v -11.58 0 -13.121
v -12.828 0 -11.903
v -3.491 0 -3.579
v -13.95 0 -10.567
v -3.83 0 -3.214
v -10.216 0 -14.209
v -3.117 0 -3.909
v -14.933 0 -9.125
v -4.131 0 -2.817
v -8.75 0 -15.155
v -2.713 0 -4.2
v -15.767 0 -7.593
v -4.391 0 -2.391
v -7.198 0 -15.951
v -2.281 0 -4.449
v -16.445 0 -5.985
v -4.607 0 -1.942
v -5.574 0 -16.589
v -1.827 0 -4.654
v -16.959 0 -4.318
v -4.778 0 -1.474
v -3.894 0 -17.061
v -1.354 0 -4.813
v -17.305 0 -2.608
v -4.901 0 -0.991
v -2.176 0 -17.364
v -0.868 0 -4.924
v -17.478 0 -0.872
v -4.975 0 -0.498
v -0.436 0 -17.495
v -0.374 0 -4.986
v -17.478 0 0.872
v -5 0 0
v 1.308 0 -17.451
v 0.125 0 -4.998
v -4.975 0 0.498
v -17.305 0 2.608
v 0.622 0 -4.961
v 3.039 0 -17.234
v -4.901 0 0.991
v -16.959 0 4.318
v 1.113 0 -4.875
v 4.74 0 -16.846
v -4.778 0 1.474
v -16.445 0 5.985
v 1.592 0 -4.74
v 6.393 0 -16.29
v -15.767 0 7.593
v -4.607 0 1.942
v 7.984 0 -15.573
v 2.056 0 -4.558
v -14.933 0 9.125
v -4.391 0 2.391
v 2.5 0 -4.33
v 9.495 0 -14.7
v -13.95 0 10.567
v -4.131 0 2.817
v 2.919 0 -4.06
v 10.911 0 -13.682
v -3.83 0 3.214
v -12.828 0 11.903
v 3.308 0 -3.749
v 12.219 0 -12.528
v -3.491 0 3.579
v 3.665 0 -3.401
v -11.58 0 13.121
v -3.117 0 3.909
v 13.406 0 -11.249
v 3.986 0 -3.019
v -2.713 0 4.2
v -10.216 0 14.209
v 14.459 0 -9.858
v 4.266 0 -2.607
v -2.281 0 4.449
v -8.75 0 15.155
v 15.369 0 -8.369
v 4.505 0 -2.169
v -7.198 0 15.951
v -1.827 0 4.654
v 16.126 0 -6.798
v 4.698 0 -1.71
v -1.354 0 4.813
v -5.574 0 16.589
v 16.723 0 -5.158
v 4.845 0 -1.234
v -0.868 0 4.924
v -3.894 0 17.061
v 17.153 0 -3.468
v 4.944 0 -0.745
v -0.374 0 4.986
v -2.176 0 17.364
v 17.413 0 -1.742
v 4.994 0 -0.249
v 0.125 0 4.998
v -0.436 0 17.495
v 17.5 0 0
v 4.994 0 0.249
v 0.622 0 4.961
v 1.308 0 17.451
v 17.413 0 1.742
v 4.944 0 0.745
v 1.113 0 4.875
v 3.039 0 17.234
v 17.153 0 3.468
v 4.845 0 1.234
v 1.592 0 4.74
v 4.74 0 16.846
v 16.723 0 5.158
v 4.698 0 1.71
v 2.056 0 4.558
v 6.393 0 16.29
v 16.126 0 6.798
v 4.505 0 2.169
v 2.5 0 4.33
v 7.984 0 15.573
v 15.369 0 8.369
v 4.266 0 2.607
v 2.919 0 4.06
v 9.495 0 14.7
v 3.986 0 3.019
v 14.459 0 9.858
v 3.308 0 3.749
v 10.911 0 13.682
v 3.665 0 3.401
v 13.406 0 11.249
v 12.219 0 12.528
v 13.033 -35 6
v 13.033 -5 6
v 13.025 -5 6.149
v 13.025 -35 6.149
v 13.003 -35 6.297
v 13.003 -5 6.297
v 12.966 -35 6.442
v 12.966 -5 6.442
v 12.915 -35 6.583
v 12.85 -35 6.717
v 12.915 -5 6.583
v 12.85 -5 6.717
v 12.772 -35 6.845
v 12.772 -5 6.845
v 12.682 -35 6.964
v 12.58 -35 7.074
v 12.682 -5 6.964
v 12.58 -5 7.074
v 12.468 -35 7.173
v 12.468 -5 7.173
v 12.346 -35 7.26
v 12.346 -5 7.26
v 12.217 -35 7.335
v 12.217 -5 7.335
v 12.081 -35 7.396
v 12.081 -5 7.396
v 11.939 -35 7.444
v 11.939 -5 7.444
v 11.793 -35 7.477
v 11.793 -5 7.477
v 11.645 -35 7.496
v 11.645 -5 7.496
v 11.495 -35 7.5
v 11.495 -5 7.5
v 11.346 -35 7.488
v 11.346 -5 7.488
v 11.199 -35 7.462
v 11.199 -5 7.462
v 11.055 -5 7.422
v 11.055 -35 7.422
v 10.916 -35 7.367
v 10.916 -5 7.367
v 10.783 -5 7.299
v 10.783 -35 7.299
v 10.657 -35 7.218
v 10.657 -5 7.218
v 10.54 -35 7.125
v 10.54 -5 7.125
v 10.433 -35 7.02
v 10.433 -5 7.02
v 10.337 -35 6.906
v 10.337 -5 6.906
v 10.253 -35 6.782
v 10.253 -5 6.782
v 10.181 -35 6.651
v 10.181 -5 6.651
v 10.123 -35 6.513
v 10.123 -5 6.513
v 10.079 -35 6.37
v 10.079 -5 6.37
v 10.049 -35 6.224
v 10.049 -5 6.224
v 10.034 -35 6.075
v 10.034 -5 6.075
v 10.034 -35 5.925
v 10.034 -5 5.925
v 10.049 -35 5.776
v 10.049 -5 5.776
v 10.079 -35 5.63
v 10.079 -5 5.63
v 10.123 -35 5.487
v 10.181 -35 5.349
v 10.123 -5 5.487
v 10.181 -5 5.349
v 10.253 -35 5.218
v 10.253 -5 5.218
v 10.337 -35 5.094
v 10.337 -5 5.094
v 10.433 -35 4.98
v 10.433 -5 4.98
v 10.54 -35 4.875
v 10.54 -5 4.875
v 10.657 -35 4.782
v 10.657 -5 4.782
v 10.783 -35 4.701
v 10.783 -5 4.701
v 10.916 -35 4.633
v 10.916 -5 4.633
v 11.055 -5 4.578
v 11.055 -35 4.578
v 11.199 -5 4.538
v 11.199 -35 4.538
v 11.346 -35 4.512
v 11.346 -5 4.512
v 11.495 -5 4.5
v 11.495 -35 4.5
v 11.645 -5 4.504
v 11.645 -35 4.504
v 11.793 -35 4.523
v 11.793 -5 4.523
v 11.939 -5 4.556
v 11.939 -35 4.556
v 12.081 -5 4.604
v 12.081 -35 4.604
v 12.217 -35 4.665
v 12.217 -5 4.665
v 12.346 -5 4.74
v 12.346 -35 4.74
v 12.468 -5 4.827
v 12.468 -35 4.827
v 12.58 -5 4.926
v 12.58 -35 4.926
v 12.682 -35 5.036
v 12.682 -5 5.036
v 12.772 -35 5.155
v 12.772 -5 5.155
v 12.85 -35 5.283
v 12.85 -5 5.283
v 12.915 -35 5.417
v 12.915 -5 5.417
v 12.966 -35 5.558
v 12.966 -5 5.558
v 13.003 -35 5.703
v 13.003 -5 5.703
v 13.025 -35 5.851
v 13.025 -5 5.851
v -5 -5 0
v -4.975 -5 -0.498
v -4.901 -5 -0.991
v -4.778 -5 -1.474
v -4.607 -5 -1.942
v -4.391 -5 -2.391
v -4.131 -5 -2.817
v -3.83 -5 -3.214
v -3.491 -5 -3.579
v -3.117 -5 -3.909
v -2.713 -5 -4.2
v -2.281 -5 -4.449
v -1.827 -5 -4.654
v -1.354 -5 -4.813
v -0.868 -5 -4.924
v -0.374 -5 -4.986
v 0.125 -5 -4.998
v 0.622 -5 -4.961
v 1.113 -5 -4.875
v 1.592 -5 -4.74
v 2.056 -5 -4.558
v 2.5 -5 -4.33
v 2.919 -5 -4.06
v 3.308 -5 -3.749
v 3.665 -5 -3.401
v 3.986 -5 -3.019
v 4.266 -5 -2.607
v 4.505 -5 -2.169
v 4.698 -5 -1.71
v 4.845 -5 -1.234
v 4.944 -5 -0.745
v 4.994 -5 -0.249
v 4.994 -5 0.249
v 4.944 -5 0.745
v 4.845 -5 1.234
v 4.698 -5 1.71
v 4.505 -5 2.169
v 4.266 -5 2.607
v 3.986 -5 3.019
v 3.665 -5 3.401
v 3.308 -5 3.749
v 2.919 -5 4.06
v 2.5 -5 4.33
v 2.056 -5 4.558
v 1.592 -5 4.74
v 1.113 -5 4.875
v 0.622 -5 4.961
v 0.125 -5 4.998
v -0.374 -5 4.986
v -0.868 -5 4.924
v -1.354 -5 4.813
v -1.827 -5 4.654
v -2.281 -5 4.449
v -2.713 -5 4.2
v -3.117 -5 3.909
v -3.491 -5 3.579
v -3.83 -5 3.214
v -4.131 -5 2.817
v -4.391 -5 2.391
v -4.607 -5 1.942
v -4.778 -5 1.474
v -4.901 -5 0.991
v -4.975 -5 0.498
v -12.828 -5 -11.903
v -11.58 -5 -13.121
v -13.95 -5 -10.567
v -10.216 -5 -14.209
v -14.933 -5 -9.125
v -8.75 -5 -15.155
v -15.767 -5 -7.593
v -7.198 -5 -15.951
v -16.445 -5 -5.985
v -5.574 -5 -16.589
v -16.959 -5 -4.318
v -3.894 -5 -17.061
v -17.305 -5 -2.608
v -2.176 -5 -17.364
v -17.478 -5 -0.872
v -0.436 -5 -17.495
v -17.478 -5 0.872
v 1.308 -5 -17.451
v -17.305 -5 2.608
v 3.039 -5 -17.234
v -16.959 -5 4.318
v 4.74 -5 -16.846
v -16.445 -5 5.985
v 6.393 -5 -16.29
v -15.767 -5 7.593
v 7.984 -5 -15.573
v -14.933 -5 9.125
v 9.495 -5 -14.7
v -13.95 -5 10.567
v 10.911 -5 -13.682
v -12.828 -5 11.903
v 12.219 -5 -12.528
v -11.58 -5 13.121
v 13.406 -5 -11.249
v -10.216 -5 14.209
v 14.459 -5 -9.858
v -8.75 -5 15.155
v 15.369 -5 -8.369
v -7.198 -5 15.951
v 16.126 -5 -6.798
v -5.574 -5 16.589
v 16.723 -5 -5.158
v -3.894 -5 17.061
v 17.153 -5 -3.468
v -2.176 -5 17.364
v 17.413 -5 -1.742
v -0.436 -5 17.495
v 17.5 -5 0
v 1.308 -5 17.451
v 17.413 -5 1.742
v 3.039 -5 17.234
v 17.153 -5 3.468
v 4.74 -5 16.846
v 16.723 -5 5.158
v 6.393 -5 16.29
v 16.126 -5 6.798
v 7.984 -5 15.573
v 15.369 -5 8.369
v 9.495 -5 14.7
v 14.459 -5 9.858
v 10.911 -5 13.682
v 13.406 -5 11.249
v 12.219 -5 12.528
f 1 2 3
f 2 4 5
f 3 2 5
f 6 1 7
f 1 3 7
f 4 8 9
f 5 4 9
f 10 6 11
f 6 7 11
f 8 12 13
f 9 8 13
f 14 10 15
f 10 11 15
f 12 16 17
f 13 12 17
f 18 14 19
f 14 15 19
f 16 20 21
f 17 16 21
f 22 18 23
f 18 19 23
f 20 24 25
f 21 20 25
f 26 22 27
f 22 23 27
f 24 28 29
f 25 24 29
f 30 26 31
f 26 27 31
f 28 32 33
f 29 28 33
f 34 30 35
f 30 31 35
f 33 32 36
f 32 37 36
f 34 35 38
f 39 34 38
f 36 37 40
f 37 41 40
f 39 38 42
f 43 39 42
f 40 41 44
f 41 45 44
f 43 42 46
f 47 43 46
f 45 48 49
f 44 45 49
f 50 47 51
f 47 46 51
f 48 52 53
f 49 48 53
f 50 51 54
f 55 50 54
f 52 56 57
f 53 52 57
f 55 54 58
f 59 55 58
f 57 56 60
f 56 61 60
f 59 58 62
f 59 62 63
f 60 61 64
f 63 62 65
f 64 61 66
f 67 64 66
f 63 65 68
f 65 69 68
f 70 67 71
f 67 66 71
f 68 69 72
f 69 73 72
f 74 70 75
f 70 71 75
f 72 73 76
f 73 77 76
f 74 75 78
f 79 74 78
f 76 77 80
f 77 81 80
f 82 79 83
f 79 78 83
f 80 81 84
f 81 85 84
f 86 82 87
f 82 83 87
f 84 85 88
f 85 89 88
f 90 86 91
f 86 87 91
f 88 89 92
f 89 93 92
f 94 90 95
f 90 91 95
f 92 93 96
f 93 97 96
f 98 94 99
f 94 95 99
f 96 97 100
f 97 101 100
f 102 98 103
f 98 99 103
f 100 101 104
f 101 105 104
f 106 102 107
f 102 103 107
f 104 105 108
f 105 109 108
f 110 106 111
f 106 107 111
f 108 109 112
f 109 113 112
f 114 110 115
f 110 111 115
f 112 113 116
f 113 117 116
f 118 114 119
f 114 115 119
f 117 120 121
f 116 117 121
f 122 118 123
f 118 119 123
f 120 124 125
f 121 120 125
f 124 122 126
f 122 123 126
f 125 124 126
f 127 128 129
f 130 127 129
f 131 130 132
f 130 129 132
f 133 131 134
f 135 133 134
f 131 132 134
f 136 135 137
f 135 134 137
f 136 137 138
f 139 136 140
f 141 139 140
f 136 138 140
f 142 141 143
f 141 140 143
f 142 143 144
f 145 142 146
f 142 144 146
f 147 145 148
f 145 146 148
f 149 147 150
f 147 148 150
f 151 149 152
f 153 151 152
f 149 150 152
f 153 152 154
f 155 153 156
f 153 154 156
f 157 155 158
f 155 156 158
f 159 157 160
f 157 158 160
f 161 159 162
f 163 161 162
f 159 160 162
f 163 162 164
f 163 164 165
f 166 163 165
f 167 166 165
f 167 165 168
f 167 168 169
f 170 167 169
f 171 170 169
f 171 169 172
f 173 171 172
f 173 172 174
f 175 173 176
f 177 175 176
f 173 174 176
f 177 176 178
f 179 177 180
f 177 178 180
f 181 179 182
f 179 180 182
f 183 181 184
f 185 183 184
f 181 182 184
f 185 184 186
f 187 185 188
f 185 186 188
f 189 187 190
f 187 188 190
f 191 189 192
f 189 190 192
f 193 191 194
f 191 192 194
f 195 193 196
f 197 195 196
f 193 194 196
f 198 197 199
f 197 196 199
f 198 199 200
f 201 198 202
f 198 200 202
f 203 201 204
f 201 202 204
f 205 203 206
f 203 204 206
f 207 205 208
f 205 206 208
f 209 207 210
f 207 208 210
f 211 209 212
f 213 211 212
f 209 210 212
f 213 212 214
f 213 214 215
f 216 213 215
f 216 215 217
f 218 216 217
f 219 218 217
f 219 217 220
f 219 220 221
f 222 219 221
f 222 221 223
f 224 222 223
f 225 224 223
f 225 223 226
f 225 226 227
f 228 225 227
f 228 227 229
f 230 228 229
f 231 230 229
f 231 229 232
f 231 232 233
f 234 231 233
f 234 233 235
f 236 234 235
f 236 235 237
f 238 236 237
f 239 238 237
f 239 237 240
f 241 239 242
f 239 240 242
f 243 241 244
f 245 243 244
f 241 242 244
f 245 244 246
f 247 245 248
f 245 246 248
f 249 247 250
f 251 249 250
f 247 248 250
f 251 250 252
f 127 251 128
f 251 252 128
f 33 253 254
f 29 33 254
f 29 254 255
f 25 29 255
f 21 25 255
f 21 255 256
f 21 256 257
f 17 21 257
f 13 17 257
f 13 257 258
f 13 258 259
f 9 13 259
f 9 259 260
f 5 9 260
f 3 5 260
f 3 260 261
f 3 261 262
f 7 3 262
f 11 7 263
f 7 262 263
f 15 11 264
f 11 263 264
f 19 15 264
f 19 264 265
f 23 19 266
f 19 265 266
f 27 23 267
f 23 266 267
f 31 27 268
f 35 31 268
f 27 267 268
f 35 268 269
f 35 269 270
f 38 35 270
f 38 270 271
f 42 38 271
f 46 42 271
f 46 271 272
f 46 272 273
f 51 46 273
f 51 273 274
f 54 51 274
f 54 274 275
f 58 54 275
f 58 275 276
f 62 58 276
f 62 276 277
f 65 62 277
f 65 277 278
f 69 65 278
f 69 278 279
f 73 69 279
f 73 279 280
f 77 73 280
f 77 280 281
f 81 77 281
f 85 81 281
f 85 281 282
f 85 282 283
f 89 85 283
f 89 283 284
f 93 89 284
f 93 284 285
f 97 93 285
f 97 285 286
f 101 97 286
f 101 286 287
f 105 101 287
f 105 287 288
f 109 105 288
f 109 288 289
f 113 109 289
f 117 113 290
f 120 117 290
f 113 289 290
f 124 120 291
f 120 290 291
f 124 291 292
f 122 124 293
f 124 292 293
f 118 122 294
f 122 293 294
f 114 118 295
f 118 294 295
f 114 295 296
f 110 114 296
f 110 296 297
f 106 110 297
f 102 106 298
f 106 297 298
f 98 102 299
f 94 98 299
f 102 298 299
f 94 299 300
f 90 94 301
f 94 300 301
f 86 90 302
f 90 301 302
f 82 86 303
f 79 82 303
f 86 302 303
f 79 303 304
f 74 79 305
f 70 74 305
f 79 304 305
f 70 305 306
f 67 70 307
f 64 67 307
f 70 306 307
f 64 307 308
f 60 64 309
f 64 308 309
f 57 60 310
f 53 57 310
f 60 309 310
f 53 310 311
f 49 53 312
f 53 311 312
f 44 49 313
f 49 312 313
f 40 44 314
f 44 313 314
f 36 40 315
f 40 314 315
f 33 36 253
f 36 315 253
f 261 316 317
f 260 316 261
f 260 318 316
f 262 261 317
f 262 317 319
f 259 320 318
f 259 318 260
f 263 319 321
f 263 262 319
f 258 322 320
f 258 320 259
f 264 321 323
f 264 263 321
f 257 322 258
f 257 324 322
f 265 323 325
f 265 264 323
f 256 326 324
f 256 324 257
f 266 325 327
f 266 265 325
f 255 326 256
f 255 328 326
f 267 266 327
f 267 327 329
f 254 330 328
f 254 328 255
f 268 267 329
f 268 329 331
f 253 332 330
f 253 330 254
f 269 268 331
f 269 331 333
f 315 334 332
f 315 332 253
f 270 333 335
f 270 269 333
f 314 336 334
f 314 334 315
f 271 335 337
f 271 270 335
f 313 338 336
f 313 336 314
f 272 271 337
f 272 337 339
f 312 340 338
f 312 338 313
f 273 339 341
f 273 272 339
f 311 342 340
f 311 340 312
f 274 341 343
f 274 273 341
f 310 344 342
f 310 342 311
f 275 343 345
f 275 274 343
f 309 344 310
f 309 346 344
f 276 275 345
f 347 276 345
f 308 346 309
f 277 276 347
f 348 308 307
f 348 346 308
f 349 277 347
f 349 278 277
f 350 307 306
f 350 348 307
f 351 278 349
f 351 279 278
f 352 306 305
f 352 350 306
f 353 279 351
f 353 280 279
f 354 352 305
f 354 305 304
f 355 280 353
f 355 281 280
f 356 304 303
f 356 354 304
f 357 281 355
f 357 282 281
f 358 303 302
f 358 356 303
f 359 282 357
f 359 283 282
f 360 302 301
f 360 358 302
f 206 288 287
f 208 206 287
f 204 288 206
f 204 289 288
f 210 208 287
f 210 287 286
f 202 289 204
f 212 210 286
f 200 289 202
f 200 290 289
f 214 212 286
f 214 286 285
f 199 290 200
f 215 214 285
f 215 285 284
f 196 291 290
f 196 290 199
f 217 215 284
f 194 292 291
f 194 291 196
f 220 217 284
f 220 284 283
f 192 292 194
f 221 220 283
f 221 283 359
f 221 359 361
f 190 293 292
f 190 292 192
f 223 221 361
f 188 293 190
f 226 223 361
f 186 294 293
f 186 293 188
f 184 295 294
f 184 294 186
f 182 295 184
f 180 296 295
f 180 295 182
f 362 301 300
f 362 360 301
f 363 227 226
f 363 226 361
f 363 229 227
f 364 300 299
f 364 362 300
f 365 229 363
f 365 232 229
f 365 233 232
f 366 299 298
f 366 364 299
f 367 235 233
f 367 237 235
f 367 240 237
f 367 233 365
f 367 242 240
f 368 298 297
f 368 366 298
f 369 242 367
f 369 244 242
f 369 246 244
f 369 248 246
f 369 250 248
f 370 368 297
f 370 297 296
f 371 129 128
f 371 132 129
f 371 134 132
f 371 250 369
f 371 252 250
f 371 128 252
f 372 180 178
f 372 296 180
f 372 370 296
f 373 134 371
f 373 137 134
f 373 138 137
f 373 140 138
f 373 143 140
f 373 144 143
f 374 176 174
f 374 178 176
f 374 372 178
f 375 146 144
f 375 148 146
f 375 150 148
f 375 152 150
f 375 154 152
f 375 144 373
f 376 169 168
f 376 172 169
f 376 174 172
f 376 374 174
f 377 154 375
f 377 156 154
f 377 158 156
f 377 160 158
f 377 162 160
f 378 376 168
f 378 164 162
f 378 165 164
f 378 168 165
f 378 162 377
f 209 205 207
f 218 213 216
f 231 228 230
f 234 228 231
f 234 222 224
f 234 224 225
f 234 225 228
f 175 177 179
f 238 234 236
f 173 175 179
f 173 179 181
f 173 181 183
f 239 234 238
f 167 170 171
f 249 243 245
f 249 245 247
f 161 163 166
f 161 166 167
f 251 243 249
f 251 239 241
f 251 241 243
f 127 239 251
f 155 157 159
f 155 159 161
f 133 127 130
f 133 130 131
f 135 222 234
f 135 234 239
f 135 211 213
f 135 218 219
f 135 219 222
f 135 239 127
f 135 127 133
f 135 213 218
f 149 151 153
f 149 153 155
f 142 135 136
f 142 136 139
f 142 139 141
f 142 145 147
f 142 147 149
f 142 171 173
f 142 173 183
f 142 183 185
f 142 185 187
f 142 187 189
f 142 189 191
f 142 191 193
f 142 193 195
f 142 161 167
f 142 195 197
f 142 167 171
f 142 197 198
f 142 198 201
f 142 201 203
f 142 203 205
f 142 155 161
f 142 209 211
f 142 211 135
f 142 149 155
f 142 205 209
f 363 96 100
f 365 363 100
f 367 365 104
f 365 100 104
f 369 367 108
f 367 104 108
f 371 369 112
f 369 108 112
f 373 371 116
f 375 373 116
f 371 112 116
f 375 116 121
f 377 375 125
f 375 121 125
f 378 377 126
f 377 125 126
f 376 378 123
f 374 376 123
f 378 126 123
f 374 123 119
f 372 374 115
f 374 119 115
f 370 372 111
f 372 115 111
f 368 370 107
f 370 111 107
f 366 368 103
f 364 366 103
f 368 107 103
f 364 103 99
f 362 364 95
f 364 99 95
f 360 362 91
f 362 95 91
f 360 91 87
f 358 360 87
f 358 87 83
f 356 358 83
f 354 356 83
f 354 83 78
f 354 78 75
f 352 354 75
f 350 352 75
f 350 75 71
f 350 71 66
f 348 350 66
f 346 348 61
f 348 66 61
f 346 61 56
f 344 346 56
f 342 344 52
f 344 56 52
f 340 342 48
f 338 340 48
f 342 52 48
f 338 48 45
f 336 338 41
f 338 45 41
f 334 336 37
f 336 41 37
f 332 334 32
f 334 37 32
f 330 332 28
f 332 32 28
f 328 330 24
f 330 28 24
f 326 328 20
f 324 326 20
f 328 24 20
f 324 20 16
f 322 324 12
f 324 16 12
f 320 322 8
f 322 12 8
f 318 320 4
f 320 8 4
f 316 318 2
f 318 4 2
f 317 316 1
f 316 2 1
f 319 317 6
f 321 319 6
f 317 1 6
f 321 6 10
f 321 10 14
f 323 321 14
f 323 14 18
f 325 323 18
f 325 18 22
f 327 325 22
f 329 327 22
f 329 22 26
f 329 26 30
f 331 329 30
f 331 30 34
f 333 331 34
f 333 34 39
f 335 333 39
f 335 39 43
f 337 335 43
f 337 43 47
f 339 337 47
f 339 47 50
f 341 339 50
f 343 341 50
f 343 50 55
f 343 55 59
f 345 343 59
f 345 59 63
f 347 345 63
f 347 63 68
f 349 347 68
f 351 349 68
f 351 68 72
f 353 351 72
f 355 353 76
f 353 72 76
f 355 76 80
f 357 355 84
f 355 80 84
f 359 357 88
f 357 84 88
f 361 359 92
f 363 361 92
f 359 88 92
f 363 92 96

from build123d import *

# Parameters (mm, degrees)
F0_R     = 17.5
F1_DEPTH = 5
F2_R     = 1.5
F3_DEPTH = 30
F5_D     = 10


with BuildPart() as f1:
    # F0 (on Front) → F1 (new body)
    with BuildSketch(Plane.XZ):
        Circle(F0_R)
    extrude(amount=F1_DEPTH)

    # F2 (on face) → F3 (join)
    with BuildSketch(Plane.XZ.offset(5)):
        with Locations((11.532563, 6)):
            Circle(F2_R)
    extrude(amount=F3_DEPTH)

    # F5 (through all)
    with Locations(Plane(origin=(0, 0, 0), x_dir=(1, 0, 0), z_dir=(0, 1, 0))):
        with Locations((0, 0)):
            Hole(F5_D / 2)


solid = f1.part
